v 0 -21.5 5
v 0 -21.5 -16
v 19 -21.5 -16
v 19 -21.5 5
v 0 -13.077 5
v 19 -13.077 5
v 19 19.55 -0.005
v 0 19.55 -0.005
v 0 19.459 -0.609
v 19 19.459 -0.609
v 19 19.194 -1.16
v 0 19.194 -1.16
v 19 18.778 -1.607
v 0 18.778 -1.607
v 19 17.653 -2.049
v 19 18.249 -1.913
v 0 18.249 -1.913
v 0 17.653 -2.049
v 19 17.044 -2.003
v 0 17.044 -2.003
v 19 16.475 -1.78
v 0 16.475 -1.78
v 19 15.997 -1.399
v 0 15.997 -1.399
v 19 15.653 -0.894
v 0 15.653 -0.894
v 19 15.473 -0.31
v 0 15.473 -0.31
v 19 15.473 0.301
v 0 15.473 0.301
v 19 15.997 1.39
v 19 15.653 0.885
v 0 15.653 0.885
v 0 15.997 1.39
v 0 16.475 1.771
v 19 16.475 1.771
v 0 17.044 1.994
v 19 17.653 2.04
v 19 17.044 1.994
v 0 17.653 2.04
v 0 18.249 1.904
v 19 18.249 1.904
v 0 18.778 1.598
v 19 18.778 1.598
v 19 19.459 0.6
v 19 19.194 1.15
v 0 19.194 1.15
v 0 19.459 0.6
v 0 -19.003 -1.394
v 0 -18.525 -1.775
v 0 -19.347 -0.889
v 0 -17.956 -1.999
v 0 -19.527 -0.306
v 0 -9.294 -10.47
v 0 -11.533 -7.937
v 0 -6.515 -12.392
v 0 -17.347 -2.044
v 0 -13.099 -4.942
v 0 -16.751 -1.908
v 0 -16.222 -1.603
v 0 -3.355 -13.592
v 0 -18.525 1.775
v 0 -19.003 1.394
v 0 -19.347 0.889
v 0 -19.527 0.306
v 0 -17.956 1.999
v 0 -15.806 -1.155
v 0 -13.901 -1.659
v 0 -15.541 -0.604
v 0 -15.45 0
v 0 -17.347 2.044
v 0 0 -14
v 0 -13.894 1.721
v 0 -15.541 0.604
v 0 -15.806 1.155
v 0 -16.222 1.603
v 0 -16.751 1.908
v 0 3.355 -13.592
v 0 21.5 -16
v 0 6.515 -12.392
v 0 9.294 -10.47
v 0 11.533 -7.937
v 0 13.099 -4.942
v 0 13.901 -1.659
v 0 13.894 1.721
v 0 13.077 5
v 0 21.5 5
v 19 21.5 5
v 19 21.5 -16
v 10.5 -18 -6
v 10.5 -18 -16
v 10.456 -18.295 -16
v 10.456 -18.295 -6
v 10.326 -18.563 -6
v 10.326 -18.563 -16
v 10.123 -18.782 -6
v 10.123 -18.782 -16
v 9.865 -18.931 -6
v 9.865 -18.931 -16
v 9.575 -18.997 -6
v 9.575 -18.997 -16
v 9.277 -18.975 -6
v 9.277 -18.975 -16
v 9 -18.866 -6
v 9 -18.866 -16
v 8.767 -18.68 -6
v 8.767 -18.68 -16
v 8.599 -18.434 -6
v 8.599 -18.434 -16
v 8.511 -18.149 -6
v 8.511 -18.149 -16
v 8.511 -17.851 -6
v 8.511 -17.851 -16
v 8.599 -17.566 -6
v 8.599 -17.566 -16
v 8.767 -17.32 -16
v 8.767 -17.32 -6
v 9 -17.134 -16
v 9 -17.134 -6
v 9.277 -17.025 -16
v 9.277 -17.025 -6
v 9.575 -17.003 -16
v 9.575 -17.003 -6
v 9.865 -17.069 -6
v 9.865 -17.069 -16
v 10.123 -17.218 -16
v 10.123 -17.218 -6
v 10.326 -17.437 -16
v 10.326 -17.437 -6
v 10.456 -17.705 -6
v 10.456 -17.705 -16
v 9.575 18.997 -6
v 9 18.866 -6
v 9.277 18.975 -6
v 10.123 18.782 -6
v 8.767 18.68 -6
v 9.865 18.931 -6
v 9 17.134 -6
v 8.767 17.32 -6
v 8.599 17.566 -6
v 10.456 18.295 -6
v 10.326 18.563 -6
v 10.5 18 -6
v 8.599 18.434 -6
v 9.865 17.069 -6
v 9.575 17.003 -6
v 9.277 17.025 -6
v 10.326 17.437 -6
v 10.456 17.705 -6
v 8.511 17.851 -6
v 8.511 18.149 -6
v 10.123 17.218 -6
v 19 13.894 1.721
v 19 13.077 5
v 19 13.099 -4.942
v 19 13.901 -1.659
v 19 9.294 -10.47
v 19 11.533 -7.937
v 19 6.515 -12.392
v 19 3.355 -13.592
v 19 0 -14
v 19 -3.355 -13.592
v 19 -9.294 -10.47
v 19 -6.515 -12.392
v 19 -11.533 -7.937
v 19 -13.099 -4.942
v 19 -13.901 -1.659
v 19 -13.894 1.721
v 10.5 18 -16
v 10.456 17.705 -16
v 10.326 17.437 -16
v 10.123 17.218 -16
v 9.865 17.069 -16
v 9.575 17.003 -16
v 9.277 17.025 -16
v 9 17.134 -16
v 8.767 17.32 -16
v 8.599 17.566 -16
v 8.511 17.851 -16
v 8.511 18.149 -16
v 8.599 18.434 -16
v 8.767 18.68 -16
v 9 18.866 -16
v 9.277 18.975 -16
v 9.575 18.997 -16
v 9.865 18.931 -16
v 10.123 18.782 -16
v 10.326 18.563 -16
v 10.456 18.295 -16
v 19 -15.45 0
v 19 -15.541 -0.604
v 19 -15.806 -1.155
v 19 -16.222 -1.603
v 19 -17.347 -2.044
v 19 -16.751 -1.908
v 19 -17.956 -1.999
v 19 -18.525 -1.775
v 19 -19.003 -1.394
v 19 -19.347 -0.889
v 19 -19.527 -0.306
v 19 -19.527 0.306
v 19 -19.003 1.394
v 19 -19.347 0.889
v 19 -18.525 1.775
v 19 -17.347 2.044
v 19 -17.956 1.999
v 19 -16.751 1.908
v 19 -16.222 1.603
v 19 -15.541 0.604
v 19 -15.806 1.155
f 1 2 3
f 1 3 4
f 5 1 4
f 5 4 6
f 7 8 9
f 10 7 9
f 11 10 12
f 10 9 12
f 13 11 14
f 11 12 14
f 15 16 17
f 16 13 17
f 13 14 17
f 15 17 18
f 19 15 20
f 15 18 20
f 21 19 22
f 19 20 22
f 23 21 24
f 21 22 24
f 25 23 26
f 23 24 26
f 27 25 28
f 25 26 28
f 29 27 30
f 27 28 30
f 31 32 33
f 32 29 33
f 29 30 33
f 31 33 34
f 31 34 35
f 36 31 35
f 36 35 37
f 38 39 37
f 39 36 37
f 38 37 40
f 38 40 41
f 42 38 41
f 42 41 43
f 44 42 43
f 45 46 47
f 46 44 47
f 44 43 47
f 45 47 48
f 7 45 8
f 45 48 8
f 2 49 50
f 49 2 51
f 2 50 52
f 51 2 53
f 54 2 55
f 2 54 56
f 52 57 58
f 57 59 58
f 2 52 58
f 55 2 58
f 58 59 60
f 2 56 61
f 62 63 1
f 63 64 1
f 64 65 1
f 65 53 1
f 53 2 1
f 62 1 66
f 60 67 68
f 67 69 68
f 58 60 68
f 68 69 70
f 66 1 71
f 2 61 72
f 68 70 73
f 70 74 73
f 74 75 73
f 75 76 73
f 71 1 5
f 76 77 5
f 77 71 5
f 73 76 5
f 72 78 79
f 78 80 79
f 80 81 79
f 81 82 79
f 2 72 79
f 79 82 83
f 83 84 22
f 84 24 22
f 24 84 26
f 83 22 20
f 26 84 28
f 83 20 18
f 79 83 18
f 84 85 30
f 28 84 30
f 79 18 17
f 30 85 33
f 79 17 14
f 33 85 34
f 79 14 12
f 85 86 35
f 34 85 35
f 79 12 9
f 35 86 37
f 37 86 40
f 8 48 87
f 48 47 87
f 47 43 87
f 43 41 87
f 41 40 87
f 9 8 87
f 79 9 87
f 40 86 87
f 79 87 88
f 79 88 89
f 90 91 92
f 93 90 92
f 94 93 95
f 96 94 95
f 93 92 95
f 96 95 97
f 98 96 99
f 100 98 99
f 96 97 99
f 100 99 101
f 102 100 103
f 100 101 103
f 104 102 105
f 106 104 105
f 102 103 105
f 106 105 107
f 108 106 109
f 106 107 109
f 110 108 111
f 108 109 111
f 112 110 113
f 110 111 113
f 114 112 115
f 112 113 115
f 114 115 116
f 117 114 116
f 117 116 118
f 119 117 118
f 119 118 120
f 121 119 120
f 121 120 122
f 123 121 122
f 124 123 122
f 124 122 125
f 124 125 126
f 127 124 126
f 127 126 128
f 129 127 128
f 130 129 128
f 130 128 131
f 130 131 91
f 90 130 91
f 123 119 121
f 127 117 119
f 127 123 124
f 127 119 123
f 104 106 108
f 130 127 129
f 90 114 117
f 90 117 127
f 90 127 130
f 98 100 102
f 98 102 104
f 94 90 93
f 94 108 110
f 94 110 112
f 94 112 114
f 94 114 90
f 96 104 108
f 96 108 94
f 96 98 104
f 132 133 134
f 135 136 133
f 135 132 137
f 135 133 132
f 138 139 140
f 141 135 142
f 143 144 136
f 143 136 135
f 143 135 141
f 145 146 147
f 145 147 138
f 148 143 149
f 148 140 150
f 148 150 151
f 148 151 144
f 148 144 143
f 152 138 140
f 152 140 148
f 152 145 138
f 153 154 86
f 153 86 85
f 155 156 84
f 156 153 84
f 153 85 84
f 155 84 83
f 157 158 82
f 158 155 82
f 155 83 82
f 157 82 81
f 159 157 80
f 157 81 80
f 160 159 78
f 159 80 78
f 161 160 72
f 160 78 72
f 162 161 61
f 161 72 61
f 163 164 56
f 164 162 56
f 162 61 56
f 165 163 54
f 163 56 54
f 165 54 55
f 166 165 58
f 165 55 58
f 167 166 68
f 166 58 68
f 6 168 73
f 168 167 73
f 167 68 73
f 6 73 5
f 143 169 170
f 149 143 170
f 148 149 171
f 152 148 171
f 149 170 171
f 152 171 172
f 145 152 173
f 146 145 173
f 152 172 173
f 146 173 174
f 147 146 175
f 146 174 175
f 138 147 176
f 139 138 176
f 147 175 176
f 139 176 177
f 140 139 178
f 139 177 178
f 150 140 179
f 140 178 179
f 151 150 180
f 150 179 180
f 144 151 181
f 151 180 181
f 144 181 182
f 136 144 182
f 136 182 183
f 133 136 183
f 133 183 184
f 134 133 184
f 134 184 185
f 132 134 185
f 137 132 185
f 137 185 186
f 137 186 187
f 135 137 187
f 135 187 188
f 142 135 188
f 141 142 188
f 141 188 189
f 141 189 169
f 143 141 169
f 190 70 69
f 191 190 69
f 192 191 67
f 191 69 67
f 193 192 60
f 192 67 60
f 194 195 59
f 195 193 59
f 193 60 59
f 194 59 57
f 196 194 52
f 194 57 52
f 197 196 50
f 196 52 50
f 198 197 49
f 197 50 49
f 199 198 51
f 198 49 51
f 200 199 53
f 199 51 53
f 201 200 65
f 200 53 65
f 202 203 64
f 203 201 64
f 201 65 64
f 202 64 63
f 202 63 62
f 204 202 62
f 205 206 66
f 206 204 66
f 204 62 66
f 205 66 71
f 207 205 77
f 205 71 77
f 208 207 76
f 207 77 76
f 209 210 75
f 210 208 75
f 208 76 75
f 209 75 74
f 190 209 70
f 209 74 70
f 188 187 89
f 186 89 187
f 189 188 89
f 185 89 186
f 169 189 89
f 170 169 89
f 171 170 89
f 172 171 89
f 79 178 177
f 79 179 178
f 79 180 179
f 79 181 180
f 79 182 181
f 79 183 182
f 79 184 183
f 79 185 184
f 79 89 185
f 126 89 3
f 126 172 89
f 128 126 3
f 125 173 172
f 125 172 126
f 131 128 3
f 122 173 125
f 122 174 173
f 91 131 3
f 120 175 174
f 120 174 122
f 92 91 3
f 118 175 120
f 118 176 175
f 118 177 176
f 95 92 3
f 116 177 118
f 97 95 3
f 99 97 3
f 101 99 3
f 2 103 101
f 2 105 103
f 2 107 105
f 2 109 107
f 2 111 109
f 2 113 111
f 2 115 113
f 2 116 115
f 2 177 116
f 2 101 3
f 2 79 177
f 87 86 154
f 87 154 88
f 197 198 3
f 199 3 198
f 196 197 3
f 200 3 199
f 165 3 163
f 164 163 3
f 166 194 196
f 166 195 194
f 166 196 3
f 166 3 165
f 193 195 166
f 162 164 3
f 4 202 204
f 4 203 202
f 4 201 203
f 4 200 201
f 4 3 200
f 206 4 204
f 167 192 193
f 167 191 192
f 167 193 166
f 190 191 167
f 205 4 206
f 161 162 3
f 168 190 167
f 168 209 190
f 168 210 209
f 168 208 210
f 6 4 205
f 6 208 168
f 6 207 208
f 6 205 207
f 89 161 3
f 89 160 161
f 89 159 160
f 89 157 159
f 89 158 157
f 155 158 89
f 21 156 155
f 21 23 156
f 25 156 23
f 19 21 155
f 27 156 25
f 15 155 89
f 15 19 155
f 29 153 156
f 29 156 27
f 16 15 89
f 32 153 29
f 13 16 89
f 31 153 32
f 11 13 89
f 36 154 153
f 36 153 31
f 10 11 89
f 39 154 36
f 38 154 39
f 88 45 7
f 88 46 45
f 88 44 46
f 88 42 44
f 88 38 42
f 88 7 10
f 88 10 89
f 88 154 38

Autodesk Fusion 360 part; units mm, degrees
sketch "Sketch1" plane through (0, 0, 0) normal (1, 0, 0) x (0, 1, 0)
  line L0 (21.5, 5) -> (21.5, -16)
  line L1 (21.5, -16) -> (-21.5, -16)
  line L2 (-21.5, -16) -> (-21.5, 5)
  line L3 (-21.5, 5) -> (-13.0767, 5)
  line L4 (13.0767, 5) -> (21.5, 5)
  arc A0 (-13.0767, 5) -> (13.0767, 5) centre (0, 0) ccw
  circle A1 centre (17.5, -0.0047) radius 2.05
  circle A2 centre (-17.5, 0) radius 2.05
  dimension "d44" = 28
  dimension "d47" = 16
  dimension "d48" = 5
  dimension "d49" = 4.1
  dimension "d50" = 21.5
  dimension "d51" = 21.5
  dimension "d52" = 17.5
  dimension "d56" = 4.1
  dimension "d57" = 17.5
extrude "Extrude1" add sketch "Sketch1" along normal blind 19
sketch "Sketch2" plane through (0, 0, 0) normal (1, 0, 0) x (0, 1, 0)
  line L0 (21.5, 3.5453) -> (21.5, -0.0047)
  point P0 (15.45, -0.0047)
  point P1 (17.5, -0.0047)
  dimension "d62" = 4
sketch "Sketch3" plane through (0, 0, -16) normal (0, 0, -1) x (1, 0, 0)
  line L0 (0, 21.5) -> (0, -21.5)
  line L1 (0, -21.5) -> (19, -21.5)
  line L2 (19, -21.5) -> (19, 21.5)
  line L3 (19, 21.5) -> (0, 21.5)
  line L4 (9.5, 25) -> (9.5, -29)
  dimension "d63" = 9.5
sketch "Sketch4" plane through (0, 0, -16) normal (0, 0, -1) x (1, 0, 0)
sketch "Sketch5" plane through (0, 0, 0) normal (1, 0, 0) x (0, 1, 0)
  line L0 (-19.794, -16) -> (-15.6772, -16)
  dimension "d64" = 4.1168
  dimension "d65" = 4.1168
sketch "Sketch6" plane through (0, 0, -16) normal (0, 0, -1) x (1, 0, 0)
  circle A0 centre (9.5, 18) radius 1
  line L0 (19, 21.5) -> (0, 21.5)
  circle A1 centre (9.5, -18) radius 1
  line L1 (0, -21.5) -> (19, -21.5)
  dimension "d66" = 2
  dimension "d67" = 3.5
  dimension "d68" = 2
  dimension "d69" = 3.5
extrude "Extrude2" cut sketch "Sketch6" against normal blind 10
